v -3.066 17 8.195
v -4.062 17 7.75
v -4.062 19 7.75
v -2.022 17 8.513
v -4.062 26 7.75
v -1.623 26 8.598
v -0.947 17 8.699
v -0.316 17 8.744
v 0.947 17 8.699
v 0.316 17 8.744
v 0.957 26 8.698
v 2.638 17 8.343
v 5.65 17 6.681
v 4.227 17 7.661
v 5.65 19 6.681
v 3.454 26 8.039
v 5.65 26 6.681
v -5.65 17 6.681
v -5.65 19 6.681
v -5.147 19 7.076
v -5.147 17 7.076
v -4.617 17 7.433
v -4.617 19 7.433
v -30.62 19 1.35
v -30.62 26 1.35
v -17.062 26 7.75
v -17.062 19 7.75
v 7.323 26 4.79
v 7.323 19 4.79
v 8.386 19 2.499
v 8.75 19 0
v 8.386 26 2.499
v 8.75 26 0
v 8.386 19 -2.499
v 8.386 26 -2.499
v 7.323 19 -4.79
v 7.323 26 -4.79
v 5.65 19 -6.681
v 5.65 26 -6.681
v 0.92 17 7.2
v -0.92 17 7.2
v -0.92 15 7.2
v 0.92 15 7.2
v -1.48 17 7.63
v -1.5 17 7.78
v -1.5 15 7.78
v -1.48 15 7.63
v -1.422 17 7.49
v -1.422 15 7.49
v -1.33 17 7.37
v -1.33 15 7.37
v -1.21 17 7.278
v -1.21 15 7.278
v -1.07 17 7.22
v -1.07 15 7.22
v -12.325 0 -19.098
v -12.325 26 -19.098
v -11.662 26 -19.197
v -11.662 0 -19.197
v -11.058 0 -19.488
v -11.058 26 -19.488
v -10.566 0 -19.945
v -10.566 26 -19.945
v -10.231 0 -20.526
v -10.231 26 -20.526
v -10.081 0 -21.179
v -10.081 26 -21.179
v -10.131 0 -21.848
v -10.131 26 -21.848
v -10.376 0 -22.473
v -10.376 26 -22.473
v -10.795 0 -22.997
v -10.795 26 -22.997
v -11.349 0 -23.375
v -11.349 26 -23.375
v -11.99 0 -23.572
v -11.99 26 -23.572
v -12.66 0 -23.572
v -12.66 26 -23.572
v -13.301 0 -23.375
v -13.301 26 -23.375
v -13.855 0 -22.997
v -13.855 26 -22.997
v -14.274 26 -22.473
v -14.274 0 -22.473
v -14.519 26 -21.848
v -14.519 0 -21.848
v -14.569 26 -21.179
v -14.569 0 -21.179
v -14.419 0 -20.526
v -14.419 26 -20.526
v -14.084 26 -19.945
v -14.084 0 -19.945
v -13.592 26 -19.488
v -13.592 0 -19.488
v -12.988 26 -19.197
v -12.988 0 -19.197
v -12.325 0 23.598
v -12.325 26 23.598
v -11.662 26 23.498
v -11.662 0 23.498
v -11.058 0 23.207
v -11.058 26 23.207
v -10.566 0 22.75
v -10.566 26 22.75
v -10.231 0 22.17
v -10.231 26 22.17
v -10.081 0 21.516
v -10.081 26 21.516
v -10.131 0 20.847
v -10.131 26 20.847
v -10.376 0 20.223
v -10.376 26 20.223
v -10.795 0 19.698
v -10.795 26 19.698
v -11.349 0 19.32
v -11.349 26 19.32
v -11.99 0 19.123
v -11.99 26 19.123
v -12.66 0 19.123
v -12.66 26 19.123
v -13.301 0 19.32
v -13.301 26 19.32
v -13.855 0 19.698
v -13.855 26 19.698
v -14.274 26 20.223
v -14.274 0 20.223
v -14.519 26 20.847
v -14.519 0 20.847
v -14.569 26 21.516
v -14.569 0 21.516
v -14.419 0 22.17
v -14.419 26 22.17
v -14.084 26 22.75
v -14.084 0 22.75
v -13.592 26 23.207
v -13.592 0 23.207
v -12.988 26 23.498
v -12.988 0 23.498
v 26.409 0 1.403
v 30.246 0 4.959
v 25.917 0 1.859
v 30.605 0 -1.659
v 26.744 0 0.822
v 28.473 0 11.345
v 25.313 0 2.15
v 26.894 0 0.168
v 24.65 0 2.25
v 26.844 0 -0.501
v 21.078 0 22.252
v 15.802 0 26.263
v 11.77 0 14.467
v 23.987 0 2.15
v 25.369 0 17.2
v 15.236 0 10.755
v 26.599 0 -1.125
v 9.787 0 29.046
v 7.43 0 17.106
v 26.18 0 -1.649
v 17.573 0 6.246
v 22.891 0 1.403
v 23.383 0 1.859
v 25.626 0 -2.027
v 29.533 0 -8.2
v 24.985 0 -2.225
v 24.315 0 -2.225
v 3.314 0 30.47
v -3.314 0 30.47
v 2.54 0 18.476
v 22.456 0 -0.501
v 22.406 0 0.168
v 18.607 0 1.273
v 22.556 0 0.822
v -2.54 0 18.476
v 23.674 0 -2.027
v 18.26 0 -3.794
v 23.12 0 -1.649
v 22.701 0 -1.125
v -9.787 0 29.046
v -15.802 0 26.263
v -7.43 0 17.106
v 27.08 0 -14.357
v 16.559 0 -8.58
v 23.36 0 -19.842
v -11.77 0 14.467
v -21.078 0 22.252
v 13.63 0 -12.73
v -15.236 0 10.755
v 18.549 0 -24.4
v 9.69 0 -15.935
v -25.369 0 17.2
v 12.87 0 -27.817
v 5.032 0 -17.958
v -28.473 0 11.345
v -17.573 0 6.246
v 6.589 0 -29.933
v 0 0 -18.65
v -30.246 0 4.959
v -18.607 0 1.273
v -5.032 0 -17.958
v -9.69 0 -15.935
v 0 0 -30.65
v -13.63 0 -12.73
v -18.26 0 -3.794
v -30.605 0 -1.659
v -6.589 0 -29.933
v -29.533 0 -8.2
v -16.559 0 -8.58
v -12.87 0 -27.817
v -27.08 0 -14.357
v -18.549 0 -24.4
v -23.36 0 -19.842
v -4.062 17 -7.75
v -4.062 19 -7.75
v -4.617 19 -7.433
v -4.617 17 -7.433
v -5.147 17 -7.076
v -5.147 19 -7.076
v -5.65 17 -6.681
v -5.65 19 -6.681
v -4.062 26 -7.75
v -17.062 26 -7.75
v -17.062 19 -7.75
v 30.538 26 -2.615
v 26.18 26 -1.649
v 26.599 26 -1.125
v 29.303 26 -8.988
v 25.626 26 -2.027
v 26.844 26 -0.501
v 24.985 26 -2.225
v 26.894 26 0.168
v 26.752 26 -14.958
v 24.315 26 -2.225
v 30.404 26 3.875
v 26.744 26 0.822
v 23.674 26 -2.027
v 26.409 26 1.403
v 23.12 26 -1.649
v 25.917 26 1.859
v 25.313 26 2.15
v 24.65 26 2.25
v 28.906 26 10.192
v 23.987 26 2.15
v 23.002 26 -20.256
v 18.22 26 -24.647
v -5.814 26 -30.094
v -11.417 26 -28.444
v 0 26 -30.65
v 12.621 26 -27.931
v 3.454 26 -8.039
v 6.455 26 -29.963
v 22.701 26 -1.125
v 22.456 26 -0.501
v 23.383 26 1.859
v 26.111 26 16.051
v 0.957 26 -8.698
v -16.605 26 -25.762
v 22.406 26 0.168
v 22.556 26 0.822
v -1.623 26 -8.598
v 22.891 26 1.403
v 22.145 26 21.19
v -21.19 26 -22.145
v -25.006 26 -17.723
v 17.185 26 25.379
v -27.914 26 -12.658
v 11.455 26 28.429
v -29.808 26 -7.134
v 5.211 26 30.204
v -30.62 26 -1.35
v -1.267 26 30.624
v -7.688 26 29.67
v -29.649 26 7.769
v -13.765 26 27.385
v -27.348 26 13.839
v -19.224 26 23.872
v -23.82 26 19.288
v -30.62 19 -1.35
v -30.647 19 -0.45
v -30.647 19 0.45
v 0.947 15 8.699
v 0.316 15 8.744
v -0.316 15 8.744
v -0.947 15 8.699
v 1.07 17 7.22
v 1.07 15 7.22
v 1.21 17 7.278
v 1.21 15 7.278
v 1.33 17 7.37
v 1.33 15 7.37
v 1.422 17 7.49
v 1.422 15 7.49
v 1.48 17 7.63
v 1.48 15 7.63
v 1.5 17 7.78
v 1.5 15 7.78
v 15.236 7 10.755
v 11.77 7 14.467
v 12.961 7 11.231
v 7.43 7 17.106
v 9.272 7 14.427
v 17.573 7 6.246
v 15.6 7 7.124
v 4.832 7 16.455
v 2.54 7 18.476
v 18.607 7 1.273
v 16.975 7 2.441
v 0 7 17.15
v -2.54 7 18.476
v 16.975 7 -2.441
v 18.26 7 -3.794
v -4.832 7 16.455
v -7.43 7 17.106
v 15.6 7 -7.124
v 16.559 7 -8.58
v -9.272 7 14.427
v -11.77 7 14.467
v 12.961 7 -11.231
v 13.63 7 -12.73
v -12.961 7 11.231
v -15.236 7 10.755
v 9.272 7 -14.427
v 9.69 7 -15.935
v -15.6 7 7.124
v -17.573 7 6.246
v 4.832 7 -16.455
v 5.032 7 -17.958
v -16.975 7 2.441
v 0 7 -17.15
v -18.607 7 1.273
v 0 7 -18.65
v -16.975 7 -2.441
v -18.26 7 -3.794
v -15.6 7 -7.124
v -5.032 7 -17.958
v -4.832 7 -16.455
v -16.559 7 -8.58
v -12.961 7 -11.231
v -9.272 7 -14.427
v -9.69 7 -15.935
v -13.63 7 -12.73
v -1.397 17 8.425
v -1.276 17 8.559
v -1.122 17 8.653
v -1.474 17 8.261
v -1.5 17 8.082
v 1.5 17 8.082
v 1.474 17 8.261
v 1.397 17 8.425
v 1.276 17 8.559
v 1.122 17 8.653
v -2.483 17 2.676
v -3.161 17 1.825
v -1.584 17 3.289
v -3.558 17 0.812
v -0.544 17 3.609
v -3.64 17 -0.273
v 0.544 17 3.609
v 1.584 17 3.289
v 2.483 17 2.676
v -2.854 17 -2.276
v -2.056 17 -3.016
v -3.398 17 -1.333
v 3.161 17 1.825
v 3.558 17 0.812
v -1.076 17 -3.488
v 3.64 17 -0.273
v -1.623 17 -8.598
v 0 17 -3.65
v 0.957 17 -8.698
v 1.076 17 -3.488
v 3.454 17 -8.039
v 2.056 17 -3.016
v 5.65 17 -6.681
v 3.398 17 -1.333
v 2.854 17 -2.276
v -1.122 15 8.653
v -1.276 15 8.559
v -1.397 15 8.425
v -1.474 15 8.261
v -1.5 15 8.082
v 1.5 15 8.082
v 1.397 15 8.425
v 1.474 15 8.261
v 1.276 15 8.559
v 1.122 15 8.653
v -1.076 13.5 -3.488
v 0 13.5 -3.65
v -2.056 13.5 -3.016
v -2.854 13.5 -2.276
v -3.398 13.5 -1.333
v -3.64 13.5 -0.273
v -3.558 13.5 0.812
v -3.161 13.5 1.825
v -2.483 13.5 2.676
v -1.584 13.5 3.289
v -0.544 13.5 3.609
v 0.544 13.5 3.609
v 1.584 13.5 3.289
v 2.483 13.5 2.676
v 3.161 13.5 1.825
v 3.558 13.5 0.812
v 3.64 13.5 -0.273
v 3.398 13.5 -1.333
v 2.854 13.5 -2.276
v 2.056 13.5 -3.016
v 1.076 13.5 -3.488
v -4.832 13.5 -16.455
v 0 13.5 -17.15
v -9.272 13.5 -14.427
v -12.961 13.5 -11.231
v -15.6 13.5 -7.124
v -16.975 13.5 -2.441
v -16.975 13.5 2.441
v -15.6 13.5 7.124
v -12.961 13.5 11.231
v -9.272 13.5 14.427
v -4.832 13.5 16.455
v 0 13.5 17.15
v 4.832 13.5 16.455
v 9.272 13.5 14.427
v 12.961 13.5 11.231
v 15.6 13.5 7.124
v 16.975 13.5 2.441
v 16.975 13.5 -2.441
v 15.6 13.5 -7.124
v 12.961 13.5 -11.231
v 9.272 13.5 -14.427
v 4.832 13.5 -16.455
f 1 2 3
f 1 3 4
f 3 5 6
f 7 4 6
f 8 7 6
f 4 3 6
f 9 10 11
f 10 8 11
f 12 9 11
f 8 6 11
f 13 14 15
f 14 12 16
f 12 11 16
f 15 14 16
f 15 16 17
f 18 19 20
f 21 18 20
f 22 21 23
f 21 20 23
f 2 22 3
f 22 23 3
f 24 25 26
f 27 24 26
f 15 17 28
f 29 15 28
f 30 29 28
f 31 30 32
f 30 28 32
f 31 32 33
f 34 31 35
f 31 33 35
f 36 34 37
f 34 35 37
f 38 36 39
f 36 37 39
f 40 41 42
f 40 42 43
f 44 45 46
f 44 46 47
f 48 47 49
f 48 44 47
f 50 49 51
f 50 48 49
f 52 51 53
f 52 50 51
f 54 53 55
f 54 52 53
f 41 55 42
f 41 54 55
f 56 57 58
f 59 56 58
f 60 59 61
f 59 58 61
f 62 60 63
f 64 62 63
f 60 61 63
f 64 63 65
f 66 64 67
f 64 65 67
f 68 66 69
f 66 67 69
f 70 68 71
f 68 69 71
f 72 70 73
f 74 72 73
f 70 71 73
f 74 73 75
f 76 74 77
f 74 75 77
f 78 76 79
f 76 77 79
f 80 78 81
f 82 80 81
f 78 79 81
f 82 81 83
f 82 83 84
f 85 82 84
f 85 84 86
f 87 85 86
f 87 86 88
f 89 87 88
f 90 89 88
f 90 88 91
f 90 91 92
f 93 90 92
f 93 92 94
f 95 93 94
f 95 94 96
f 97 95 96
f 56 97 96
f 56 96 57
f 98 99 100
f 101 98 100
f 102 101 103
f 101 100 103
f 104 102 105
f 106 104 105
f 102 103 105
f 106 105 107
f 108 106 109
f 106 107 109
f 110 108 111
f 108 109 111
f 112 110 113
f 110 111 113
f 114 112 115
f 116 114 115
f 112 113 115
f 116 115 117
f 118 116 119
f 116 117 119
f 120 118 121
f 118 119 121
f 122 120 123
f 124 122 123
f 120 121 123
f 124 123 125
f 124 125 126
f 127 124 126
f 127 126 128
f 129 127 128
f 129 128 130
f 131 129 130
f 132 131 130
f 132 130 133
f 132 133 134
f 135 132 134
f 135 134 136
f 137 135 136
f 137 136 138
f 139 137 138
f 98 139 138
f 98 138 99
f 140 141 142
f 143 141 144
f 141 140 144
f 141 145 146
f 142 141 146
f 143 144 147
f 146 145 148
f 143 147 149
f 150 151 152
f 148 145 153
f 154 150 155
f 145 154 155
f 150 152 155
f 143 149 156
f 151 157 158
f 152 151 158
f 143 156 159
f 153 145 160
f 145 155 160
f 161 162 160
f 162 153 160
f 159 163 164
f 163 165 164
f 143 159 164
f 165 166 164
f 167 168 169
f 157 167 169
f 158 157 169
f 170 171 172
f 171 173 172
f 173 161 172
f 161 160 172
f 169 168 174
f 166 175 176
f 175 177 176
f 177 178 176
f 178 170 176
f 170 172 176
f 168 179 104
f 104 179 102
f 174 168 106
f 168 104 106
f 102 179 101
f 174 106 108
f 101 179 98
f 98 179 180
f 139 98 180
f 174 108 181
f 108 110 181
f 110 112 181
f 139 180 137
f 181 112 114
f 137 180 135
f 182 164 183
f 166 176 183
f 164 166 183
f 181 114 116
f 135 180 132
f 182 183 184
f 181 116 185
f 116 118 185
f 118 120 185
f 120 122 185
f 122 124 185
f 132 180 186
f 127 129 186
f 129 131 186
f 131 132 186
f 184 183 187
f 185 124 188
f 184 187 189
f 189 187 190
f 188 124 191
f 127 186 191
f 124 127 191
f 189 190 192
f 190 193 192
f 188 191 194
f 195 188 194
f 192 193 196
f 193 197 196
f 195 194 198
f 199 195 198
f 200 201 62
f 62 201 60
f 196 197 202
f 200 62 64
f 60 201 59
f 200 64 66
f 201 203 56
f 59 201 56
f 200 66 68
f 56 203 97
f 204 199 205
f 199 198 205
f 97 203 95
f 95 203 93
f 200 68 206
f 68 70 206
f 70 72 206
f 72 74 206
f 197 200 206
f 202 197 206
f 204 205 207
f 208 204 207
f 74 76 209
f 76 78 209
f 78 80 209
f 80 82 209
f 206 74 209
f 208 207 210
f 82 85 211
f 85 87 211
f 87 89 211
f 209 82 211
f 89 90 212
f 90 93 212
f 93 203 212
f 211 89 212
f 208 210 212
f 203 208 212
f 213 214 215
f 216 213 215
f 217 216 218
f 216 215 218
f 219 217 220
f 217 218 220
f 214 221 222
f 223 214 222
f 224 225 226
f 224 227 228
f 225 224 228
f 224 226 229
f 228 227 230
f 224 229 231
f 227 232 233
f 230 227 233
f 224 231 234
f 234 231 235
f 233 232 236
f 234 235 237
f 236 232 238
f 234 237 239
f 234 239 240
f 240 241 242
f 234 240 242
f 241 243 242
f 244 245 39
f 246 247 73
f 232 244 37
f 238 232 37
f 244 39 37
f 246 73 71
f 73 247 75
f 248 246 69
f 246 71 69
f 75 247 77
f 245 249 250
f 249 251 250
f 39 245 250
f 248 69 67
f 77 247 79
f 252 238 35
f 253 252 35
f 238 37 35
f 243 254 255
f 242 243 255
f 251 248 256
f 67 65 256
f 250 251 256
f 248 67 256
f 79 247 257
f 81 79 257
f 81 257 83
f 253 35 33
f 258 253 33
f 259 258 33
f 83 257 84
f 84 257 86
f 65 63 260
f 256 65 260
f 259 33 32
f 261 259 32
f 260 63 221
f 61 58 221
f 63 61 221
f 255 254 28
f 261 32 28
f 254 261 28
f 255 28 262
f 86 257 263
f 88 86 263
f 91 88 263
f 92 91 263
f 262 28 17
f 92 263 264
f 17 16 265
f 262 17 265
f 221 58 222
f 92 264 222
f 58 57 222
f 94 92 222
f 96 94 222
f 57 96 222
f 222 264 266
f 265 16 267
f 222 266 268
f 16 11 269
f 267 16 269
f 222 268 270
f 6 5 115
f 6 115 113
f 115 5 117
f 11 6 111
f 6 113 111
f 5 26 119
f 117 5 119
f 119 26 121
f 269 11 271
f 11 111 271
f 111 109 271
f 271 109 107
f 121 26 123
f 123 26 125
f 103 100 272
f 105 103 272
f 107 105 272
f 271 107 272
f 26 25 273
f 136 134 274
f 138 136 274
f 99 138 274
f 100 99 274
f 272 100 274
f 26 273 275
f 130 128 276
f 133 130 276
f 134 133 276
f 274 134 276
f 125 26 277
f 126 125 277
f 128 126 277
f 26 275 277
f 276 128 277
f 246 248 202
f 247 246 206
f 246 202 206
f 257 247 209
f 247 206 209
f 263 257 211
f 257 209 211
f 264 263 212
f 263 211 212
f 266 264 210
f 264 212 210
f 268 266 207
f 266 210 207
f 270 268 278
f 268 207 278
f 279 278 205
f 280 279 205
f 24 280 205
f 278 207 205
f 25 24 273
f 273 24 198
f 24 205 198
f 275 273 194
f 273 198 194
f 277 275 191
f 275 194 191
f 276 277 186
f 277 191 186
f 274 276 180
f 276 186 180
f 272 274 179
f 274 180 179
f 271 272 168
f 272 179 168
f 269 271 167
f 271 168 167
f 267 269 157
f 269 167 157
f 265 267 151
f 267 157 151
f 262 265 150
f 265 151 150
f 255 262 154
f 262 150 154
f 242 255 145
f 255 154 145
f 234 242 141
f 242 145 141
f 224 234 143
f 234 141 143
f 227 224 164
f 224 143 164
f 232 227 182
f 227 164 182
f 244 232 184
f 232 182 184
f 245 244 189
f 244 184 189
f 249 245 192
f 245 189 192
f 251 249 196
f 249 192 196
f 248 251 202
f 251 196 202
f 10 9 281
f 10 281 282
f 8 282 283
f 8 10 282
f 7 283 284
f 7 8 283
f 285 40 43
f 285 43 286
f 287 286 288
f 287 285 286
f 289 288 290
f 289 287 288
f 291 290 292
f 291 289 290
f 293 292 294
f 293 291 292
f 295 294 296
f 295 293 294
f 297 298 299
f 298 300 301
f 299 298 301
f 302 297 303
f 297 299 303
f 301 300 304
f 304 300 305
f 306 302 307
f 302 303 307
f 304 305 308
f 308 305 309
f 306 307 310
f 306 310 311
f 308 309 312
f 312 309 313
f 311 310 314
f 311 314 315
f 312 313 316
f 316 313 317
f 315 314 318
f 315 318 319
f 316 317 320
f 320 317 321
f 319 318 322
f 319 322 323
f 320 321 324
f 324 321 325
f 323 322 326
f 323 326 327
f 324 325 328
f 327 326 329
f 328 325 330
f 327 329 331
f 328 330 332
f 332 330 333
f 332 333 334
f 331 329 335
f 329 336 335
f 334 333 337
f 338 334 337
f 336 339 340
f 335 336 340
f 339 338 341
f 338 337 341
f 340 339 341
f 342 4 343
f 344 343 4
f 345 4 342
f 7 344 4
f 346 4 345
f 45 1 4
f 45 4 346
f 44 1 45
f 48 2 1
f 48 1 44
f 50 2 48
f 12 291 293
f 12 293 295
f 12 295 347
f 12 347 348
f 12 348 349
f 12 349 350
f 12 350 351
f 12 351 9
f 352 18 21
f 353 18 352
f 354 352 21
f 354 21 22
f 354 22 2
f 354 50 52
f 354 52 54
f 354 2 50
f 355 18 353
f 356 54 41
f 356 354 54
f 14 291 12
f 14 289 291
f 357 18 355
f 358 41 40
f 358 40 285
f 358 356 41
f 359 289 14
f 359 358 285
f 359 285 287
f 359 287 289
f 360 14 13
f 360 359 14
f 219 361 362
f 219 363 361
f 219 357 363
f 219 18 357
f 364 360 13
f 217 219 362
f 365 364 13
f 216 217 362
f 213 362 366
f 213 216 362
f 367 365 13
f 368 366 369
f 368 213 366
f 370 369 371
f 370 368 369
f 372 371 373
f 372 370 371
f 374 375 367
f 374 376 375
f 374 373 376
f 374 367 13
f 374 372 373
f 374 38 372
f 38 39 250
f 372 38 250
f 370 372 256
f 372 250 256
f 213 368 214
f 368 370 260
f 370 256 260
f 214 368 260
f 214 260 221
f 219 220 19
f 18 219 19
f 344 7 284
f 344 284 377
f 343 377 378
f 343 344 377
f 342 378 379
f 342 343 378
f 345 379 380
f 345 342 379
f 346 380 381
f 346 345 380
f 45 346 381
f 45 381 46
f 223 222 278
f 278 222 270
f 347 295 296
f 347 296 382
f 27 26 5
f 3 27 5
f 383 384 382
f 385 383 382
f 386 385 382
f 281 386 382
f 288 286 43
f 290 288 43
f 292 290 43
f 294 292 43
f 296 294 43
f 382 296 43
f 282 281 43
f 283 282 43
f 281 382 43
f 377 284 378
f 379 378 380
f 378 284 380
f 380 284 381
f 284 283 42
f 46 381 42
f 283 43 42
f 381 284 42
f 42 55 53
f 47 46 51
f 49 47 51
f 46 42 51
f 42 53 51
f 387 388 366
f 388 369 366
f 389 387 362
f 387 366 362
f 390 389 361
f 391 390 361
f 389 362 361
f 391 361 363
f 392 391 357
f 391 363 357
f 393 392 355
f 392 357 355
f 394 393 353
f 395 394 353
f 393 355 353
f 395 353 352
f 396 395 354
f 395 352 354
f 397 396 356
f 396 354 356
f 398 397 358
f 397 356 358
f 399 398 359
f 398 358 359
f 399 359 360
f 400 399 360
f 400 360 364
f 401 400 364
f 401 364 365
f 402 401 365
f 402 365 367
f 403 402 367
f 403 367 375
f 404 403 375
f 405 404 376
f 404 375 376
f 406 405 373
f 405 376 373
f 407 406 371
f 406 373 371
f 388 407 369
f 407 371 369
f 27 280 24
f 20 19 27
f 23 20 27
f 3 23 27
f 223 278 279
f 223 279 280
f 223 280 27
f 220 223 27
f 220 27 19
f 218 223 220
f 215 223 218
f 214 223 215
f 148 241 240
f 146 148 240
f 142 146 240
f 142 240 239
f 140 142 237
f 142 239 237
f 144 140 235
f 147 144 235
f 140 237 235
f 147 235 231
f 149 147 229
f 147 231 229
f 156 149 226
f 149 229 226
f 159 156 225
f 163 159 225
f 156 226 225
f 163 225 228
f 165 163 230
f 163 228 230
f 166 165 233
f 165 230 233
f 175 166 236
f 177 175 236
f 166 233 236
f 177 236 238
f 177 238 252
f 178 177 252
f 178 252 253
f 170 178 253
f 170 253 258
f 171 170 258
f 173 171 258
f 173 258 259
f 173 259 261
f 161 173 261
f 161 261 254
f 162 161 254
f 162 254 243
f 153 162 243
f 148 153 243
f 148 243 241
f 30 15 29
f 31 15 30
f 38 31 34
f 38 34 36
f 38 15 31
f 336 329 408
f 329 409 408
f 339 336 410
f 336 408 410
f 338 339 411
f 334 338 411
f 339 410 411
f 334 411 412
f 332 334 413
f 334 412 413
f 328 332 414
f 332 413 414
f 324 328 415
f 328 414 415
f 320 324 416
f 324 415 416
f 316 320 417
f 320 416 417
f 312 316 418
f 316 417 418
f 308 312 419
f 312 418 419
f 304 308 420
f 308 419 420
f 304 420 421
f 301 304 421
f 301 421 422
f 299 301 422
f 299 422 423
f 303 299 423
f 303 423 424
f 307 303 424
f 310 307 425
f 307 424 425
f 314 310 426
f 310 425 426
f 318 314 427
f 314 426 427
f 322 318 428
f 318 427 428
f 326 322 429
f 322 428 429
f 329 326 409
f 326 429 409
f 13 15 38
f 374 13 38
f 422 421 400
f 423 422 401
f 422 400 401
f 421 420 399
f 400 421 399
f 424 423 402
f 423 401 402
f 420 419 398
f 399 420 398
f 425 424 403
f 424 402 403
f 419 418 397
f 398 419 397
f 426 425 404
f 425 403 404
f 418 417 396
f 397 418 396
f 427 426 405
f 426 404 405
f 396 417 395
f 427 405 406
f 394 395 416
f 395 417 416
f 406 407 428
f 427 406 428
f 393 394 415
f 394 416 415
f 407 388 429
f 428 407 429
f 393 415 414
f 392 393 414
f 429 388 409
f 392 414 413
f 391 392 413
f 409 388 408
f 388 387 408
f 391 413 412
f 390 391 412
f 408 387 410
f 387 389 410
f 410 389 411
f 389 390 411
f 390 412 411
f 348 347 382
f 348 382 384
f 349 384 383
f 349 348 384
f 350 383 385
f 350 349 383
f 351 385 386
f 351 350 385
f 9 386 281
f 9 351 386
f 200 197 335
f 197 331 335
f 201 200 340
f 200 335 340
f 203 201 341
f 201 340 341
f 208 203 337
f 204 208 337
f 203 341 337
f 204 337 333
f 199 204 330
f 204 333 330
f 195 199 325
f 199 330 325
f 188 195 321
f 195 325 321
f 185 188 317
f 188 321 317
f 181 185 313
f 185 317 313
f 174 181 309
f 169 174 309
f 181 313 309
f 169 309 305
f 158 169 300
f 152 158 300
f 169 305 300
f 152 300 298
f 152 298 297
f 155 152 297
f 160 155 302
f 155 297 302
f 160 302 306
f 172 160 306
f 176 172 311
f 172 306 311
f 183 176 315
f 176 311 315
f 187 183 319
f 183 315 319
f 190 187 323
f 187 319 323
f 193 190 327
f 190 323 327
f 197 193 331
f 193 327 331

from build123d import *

# Parameters (mm, degrees)
CUT_EXTRUDE_1316_DEPTH = 9
CUT_EXTRUDE_1657_DEPTH = 2
CUT_EXTRUDE_1713_DEPTH = 7
SKETCH_1963_R          = 2.25
CUT_EXTRUDE_2333_DEPTH = 51.545474575


with BuildPart() as part:
    # Эскиз1 → Повернуть1 (revolve)
    with BuildSketch(Plane.XY):
        Polygon((0, 26), (30.65, 26), (30.65, 0), (18.65, 0), (18.65, 7), (17.15, 7), (17.15, 13.5), (3.65, 13.5), (3.65, 17), (0, 17), align=None)
    revolve(axis=Axis((0, 0, 0), (0, 1, 0)))

    # Sketch 667 → Cut-Extrude 1316 (cut)
    with BuildSketch(Plane(origin=(0, 26, 0), x_dir=(1, 0, 0), z_dir=(0, 1, 0))):
        with BuildLine():
            Line((5.65, -6.681317235), (5.65, 6.681317235))
            ThreePointArc((5.65, 6.681317235), (0, 8.75), (-5.65, 6.681317235))
            Line((-5.65, 6.681317235), (-5.65, -6.681317235))
            ThreePointArc((-5.65, -6.681317235), (0, -8.75), (5.65, -6.681317235))
        make_face()
    extrude(amount=-CUT_EXTRUDE_1316_DEPTH, mode=Mode.SUBTRACT)

    # Sketch 1370 → Cut-Extrude 1657 (cut)
    with BuildSketch(Plane(origin=(0, 17, 0), x_dir=(1, 0, 0), z_dir=(0, 1, 0))):
        with BuildLine():
            Line((-0.92, -7.2), (0.92, -7.2))
            ThreePointArc((0.92, -7.2), (1.330121933, -7.369878067), (1.5, -7.78))
            Line((1.5, -7.78), (1.5, -8.082233602))
            ThreePointArc((1.5, -8.082233602), (1.341523495, -8.496233679), (0.947109471, -8.6985909))
            ThreePointArc((0.947109471, -8.6985909), (0, -8.75), (-0.947109471, -8.6985909))
            ThreePointArc((-0.947109471, -8.6985909), (-1.341523495, -8.496233679), (-1.5, -8.082233602))
            Line((-1.5, -8.082233602), (-1.5, -7.78))
            ThreePointArc((-1.5, -7.78), (-1.330121933, -7.369878067), (-0.92, -7.2))
        make_face()
    extrude(amount=-CUT_EXTRUDE_1657_DEPTH, mode=Mode.SUBTRACT)

    # Эскиз под резистор<3> → Cut-Extrude 1713 (cut)
    with BuildSketch(Plane(origin=(0, 26, 0), x_dir=(1, 0, 0), z_dir=(0, 1, 0))):
        with BuildLine():
            ThreePointArc((5.65, -6.681317235), (8.75, 0), (5.65, 6.681317235))
            Line((5.65, 6.681317235), (5.65, -6.681317235))
        make_face()
        with BuildLine():
            ThreePointArc((-5.65, 6.681317235), (-4.885319842, 7.259211392), (-4.062019202, 7.75))
            Line((-4.062019202, 7.75), (-17.062019202, 7.75))
            Line((-17.062019202, 7.75), (-30.620254734, 1.35))
            ThreePointArc((-30.620254734, 1.35), (-30.65, 0), (-30.620254734, -1.35))
            Line((-30.620254734, -1.35), (-17.062019202, -7.75))
            Line((-17.062019202, -7.75), (-4.062019202, -7.75))
            ThreePointArc((-4.062019202, -7.75), (-4.885319842, -7.259211392), (-5.65, -6.681317235))
            Line((-5.65, -6.681317235), (-5.65, 6.681317235))
        make_face()
    extrude(amount=-CUT_EXTRUDE_1713_DEPTH, mode=Mode.SUBTRACT)

    # Sketch 1963 → Cut-Extrude 2333 (cut, through all)
    with BuildSketch(Plane(origin=(0, 26, 0), x_dir=(1, 0, 0), z_dir=(0, 1, 0))):
        with Locations((24.65, 0)):
            Circle(SKETCH_1963_R)
        with Locations((-12.325, -21.347526203)):
            Circle(SKETCH_1963_R)
        with Locations((-12.325, 21.347526203)):
            Circle(SKETCH_1963_R)
    extrude(amount=-CUT_EXTRUDE_2333_DEPTH, mode=Mode.SUBTRACT)


solid = part.part
